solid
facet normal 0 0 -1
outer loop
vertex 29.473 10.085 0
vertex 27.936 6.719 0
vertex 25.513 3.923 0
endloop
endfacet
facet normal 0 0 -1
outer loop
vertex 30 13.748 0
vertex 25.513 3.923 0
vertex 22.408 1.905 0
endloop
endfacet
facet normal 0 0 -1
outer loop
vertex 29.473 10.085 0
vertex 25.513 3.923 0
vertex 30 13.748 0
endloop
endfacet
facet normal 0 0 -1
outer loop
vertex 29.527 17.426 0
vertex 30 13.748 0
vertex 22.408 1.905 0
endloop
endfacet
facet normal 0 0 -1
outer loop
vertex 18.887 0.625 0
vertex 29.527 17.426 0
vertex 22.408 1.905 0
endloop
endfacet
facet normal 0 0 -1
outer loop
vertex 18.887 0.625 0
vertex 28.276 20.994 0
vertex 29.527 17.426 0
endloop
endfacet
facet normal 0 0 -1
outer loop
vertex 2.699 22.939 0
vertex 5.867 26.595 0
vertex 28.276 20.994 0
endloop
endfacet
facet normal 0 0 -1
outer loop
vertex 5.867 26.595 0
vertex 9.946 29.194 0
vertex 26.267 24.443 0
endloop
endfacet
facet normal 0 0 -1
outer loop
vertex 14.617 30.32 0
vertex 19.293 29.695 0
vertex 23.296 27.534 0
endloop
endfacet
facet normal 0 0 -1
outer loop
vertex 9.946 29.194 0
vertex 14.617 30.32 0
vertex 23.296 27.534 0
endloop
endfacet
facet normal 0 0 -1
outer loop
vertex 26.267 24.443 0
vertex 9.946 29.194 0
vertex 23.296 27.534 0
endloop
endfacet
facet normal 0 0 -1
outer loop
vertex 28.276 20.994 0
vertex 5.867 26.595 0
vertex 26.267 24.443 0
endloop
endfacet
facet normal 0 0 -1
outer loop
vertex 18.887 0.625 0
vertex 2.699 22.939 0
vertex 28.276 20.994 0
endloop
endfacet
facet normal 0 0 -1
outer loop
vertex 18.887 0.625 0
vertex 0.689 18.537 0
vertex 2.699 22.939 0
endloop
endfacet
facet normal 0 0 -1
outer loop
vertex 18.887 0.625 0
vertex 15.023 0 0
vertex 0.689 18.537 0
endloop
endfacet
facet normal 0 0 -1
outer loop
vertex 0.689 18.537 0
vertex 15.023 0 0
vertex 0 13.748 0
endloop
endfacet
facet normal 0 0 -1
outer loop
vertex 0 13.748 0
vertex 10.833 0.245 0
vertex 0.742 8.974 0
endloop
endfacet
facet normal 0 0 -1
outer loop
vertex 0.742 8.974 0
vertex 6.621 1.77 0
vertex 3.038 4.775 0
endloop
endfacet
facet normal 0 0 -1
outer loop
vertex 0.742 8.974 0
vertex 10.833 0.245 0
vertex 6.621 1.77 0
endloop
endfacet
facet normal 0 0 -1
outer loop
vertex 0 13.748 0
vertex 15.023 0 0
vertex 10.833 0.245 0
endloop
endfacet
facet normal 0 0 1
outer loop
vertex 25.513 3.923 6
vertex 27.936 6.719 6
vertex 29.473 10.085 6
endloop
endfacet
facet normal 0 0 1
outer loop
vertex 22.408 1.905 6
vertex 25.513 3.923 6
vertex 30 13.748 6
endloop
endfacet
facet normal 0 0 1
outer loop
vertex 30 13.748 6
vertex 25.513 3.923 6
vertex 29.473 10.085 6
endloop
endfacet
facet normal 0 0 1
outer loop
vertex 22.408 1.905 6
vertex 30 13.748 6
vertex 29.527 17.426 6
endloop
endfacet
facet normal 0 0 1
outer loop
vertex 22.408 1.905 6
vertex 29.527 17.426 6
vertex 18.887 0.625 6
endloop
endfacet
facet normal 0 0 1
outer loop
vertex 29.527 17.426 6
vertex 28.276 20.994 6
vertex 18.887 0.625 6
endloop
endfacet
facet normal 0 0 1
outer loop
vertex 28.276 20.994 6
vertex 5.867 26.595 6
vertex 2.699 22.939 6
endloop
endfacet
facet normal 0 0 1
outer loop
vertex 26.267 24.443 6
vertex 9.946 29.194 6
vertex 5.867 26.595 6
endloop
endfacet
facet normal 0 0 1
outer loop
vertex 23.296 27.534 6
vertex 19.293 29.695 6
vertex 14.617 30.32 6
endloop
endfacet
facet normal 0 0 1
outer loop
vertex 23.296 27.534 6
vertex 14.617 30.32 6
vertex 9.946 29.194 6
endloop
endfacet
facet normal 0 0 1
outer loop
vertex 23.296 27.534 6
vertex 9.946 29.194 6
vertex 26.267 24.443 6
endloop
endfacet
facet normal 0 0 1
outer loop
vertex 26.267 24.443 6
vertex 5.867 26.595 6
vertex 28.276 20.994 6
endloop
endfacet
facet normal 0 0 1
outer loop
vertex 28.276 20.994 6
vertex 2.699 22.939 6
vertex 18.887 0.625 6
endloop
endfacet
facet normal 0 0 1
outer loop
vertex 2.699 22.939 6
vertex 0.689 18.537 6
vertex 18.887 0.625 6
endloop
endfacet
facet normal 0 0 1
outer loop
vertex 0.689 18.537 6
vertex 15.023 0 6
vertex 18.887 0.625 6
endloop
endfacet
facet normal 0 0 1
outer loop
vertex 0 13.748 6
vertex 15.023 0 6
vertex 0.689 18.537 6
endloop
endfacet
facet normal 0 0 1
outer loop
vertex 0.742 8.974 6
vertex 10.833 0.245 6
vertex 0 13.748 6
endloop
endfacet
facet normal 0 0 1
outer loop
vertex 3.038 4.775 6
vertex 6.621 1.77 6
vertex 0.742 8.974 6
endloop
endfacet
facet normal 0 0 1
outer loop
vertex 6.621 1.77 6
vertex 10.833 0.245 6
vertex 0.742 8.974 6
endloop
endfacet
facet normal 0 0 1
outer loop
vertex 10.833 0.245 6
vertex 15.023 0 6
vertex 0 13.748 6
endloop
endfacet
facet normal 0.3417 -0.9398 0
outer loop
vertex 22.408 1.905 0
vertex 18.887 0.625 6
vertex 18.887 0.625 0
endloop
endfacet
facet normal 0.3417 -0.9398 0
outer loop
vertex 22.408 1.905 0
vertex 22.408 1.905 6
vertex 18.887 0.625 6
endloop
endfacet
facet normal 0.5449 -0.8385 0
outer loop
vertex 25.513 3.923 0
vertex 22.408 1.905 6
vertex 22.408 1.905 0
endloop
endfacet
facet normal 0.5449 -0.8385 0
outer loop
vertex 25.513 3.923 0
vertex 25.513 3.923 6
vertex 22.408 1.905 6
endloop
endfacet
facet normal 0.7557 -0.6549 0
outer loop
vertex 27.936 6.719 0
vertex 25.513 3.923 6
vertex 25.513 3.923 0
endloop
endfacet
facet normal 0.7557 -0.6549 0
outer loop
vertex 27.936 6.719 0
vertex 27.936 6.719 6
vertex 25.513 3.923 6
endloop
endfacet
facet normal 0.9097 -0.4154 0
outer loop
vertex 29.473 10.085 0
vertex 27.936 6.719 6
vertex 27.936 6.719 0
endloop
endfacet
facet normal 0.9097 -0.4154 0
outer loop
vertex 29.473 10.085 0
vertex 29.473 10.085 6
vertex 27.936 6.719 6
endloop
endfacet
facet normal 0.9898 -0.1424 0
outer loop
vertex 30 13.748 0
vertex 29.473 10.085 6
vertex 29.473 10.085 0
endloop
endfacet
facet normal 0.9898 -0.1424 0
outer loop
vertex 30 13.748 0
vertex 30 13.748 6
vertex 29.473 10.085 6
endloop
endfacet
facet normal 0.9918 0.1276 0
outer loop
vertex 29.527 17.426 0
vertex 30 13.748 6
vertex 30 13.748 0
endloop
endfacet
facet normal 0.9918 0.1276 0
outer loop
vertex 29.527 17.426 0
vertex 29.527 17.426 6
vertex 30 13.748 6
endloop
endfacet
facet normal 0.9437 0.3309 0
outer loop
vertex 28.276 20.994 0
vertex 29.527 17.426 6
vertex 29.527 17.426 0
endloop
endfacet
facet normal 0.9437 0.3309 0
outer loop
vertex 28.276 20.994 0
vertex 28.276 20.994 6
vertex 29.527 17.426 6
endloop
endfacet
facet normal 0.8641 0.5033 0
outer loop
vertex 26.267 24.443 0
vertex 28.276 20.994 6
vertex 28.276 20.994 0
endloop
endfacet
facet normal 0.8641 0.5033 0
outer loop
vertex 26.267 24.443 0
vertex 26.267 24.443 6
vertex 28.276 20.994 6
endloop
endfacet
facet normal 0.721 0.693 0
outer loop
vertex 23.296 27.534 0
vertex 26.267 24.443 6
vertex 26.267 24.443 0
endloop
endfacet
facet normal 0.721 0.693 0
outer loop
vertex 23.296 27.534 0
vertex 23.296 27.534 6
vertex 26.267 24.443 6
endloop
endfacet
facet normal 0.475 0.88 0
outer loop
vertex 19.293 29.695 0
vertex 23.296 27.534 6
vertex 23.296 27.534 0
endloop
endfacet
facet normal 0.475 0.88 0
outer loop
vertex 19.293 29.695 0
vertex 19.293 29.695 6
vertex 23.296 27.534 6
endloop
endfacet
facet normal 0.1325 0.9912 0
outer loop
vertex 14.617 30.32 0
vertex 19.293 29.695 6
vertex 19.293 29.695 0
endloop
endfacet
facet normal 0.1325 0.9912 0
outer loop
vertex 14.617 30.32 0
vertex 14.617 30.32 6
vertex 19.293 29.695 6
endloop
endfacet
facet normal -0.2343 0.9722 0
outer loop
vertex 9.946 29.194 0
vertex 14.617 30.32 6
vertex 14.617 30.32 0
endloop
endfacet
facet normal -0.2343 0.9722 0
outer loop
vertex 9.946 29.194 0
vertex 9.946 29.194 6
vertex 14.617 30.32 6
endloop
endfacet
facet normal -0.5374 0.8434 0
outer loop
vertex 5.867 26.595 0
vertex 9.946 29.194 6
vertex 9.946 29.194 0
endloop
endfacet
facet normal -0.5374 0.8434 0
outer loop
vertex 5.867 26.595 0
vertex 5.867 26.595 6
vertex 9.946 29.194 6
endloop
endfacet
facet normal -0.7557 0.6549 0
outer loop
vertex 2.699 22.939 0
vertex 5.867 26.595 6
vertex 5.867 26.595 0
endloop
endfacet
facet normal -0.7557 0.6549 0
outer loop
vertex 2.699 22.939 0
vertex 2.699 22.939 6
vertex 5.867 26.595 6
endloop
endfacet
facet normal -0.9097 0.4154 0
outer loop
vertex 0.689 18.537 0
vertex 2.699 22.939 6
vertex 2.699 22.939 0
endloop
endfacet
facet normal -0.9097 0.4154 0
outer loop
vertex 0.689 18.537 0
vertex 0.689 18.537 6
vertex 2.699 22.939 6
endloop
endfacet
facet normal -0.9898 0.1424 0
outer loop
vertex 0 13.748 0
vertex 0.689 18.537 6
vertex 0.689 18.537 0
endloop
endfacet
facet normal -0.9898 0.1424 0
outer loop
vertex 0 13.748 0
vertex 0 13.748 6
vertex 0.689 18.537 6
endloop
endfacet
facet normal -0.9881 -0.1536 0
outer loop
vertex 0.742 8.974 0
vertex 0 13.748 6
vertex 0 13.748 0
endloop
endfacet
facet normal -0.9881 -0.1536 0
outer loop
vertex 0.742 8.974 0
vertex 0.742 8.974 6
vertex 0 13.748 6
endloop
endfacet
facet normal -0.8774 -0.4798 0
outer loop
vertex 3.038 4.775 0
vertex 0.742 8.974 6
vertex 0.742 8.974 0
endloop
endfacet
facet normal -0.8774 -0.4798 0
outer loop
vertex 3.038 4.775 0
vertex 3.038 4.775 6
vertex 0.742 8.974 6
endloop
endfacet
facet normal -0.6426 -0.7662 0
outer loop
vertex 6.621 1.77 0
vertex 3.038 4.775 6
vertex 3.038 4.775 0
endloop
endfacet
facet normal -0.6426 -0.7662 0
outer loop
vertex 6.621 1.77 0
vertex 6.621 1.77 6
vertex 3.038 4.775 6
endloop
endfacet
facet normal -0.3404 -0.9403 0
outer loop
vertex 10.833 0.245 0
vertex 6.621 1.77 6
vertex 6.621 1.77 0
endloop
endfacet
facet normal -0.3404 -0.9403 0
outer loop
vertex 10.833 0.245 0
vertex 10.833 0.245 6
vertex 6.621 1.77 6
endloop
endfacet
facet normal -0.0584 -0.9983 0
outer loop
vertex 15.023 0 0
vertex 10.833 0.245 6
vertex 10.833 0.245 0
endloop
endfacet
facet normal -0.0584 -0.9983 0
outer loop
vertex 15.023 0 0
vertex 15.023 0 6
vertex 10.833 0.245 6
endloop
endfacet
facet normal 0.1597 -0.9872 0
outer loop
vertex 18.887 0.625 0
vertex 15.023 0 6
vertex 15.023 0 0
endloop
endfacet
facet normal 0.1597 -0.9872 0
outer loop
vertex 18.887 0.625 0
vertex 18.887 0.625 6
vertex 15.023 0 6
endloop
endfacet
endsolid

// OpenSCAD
$fn = 32;

// ----------------------------------------------------------------------
// Cam disc: base radius 13.0 mm, lift 4.0 mm, 22 profile points
// ----------------------------------------------------------------------

// --- parameters (mm) ---
profile_height = 6;       // extrusion height
profile_points = 22;      // points of the closed outline

profile = [[30, 13.748], [29.527, 17.426], [28.276, 20.994], [26.267, 24.443], [23.296, 27.534], [19.293, 29.695], [14.617, 30.32], [9.946, 29.194], [5.867, 26.595], [2.699, 22.939], [0.689, 18.537], [0, 13.748], [0.742, 8.974], [3.038, 4.775], [6.621, 1.77], [10.833, 0.245], [15.023, 0], [18.887, 0.625], [22.408, 1.905], [25.513, 3.923], [27.936, 6.719], [29.473, 10.085]];  // single closed polygon, 22 points, counter clockwise

// --- the one profile operation ---
linear_extrude(height = profile_height) polygon(points = profile);
